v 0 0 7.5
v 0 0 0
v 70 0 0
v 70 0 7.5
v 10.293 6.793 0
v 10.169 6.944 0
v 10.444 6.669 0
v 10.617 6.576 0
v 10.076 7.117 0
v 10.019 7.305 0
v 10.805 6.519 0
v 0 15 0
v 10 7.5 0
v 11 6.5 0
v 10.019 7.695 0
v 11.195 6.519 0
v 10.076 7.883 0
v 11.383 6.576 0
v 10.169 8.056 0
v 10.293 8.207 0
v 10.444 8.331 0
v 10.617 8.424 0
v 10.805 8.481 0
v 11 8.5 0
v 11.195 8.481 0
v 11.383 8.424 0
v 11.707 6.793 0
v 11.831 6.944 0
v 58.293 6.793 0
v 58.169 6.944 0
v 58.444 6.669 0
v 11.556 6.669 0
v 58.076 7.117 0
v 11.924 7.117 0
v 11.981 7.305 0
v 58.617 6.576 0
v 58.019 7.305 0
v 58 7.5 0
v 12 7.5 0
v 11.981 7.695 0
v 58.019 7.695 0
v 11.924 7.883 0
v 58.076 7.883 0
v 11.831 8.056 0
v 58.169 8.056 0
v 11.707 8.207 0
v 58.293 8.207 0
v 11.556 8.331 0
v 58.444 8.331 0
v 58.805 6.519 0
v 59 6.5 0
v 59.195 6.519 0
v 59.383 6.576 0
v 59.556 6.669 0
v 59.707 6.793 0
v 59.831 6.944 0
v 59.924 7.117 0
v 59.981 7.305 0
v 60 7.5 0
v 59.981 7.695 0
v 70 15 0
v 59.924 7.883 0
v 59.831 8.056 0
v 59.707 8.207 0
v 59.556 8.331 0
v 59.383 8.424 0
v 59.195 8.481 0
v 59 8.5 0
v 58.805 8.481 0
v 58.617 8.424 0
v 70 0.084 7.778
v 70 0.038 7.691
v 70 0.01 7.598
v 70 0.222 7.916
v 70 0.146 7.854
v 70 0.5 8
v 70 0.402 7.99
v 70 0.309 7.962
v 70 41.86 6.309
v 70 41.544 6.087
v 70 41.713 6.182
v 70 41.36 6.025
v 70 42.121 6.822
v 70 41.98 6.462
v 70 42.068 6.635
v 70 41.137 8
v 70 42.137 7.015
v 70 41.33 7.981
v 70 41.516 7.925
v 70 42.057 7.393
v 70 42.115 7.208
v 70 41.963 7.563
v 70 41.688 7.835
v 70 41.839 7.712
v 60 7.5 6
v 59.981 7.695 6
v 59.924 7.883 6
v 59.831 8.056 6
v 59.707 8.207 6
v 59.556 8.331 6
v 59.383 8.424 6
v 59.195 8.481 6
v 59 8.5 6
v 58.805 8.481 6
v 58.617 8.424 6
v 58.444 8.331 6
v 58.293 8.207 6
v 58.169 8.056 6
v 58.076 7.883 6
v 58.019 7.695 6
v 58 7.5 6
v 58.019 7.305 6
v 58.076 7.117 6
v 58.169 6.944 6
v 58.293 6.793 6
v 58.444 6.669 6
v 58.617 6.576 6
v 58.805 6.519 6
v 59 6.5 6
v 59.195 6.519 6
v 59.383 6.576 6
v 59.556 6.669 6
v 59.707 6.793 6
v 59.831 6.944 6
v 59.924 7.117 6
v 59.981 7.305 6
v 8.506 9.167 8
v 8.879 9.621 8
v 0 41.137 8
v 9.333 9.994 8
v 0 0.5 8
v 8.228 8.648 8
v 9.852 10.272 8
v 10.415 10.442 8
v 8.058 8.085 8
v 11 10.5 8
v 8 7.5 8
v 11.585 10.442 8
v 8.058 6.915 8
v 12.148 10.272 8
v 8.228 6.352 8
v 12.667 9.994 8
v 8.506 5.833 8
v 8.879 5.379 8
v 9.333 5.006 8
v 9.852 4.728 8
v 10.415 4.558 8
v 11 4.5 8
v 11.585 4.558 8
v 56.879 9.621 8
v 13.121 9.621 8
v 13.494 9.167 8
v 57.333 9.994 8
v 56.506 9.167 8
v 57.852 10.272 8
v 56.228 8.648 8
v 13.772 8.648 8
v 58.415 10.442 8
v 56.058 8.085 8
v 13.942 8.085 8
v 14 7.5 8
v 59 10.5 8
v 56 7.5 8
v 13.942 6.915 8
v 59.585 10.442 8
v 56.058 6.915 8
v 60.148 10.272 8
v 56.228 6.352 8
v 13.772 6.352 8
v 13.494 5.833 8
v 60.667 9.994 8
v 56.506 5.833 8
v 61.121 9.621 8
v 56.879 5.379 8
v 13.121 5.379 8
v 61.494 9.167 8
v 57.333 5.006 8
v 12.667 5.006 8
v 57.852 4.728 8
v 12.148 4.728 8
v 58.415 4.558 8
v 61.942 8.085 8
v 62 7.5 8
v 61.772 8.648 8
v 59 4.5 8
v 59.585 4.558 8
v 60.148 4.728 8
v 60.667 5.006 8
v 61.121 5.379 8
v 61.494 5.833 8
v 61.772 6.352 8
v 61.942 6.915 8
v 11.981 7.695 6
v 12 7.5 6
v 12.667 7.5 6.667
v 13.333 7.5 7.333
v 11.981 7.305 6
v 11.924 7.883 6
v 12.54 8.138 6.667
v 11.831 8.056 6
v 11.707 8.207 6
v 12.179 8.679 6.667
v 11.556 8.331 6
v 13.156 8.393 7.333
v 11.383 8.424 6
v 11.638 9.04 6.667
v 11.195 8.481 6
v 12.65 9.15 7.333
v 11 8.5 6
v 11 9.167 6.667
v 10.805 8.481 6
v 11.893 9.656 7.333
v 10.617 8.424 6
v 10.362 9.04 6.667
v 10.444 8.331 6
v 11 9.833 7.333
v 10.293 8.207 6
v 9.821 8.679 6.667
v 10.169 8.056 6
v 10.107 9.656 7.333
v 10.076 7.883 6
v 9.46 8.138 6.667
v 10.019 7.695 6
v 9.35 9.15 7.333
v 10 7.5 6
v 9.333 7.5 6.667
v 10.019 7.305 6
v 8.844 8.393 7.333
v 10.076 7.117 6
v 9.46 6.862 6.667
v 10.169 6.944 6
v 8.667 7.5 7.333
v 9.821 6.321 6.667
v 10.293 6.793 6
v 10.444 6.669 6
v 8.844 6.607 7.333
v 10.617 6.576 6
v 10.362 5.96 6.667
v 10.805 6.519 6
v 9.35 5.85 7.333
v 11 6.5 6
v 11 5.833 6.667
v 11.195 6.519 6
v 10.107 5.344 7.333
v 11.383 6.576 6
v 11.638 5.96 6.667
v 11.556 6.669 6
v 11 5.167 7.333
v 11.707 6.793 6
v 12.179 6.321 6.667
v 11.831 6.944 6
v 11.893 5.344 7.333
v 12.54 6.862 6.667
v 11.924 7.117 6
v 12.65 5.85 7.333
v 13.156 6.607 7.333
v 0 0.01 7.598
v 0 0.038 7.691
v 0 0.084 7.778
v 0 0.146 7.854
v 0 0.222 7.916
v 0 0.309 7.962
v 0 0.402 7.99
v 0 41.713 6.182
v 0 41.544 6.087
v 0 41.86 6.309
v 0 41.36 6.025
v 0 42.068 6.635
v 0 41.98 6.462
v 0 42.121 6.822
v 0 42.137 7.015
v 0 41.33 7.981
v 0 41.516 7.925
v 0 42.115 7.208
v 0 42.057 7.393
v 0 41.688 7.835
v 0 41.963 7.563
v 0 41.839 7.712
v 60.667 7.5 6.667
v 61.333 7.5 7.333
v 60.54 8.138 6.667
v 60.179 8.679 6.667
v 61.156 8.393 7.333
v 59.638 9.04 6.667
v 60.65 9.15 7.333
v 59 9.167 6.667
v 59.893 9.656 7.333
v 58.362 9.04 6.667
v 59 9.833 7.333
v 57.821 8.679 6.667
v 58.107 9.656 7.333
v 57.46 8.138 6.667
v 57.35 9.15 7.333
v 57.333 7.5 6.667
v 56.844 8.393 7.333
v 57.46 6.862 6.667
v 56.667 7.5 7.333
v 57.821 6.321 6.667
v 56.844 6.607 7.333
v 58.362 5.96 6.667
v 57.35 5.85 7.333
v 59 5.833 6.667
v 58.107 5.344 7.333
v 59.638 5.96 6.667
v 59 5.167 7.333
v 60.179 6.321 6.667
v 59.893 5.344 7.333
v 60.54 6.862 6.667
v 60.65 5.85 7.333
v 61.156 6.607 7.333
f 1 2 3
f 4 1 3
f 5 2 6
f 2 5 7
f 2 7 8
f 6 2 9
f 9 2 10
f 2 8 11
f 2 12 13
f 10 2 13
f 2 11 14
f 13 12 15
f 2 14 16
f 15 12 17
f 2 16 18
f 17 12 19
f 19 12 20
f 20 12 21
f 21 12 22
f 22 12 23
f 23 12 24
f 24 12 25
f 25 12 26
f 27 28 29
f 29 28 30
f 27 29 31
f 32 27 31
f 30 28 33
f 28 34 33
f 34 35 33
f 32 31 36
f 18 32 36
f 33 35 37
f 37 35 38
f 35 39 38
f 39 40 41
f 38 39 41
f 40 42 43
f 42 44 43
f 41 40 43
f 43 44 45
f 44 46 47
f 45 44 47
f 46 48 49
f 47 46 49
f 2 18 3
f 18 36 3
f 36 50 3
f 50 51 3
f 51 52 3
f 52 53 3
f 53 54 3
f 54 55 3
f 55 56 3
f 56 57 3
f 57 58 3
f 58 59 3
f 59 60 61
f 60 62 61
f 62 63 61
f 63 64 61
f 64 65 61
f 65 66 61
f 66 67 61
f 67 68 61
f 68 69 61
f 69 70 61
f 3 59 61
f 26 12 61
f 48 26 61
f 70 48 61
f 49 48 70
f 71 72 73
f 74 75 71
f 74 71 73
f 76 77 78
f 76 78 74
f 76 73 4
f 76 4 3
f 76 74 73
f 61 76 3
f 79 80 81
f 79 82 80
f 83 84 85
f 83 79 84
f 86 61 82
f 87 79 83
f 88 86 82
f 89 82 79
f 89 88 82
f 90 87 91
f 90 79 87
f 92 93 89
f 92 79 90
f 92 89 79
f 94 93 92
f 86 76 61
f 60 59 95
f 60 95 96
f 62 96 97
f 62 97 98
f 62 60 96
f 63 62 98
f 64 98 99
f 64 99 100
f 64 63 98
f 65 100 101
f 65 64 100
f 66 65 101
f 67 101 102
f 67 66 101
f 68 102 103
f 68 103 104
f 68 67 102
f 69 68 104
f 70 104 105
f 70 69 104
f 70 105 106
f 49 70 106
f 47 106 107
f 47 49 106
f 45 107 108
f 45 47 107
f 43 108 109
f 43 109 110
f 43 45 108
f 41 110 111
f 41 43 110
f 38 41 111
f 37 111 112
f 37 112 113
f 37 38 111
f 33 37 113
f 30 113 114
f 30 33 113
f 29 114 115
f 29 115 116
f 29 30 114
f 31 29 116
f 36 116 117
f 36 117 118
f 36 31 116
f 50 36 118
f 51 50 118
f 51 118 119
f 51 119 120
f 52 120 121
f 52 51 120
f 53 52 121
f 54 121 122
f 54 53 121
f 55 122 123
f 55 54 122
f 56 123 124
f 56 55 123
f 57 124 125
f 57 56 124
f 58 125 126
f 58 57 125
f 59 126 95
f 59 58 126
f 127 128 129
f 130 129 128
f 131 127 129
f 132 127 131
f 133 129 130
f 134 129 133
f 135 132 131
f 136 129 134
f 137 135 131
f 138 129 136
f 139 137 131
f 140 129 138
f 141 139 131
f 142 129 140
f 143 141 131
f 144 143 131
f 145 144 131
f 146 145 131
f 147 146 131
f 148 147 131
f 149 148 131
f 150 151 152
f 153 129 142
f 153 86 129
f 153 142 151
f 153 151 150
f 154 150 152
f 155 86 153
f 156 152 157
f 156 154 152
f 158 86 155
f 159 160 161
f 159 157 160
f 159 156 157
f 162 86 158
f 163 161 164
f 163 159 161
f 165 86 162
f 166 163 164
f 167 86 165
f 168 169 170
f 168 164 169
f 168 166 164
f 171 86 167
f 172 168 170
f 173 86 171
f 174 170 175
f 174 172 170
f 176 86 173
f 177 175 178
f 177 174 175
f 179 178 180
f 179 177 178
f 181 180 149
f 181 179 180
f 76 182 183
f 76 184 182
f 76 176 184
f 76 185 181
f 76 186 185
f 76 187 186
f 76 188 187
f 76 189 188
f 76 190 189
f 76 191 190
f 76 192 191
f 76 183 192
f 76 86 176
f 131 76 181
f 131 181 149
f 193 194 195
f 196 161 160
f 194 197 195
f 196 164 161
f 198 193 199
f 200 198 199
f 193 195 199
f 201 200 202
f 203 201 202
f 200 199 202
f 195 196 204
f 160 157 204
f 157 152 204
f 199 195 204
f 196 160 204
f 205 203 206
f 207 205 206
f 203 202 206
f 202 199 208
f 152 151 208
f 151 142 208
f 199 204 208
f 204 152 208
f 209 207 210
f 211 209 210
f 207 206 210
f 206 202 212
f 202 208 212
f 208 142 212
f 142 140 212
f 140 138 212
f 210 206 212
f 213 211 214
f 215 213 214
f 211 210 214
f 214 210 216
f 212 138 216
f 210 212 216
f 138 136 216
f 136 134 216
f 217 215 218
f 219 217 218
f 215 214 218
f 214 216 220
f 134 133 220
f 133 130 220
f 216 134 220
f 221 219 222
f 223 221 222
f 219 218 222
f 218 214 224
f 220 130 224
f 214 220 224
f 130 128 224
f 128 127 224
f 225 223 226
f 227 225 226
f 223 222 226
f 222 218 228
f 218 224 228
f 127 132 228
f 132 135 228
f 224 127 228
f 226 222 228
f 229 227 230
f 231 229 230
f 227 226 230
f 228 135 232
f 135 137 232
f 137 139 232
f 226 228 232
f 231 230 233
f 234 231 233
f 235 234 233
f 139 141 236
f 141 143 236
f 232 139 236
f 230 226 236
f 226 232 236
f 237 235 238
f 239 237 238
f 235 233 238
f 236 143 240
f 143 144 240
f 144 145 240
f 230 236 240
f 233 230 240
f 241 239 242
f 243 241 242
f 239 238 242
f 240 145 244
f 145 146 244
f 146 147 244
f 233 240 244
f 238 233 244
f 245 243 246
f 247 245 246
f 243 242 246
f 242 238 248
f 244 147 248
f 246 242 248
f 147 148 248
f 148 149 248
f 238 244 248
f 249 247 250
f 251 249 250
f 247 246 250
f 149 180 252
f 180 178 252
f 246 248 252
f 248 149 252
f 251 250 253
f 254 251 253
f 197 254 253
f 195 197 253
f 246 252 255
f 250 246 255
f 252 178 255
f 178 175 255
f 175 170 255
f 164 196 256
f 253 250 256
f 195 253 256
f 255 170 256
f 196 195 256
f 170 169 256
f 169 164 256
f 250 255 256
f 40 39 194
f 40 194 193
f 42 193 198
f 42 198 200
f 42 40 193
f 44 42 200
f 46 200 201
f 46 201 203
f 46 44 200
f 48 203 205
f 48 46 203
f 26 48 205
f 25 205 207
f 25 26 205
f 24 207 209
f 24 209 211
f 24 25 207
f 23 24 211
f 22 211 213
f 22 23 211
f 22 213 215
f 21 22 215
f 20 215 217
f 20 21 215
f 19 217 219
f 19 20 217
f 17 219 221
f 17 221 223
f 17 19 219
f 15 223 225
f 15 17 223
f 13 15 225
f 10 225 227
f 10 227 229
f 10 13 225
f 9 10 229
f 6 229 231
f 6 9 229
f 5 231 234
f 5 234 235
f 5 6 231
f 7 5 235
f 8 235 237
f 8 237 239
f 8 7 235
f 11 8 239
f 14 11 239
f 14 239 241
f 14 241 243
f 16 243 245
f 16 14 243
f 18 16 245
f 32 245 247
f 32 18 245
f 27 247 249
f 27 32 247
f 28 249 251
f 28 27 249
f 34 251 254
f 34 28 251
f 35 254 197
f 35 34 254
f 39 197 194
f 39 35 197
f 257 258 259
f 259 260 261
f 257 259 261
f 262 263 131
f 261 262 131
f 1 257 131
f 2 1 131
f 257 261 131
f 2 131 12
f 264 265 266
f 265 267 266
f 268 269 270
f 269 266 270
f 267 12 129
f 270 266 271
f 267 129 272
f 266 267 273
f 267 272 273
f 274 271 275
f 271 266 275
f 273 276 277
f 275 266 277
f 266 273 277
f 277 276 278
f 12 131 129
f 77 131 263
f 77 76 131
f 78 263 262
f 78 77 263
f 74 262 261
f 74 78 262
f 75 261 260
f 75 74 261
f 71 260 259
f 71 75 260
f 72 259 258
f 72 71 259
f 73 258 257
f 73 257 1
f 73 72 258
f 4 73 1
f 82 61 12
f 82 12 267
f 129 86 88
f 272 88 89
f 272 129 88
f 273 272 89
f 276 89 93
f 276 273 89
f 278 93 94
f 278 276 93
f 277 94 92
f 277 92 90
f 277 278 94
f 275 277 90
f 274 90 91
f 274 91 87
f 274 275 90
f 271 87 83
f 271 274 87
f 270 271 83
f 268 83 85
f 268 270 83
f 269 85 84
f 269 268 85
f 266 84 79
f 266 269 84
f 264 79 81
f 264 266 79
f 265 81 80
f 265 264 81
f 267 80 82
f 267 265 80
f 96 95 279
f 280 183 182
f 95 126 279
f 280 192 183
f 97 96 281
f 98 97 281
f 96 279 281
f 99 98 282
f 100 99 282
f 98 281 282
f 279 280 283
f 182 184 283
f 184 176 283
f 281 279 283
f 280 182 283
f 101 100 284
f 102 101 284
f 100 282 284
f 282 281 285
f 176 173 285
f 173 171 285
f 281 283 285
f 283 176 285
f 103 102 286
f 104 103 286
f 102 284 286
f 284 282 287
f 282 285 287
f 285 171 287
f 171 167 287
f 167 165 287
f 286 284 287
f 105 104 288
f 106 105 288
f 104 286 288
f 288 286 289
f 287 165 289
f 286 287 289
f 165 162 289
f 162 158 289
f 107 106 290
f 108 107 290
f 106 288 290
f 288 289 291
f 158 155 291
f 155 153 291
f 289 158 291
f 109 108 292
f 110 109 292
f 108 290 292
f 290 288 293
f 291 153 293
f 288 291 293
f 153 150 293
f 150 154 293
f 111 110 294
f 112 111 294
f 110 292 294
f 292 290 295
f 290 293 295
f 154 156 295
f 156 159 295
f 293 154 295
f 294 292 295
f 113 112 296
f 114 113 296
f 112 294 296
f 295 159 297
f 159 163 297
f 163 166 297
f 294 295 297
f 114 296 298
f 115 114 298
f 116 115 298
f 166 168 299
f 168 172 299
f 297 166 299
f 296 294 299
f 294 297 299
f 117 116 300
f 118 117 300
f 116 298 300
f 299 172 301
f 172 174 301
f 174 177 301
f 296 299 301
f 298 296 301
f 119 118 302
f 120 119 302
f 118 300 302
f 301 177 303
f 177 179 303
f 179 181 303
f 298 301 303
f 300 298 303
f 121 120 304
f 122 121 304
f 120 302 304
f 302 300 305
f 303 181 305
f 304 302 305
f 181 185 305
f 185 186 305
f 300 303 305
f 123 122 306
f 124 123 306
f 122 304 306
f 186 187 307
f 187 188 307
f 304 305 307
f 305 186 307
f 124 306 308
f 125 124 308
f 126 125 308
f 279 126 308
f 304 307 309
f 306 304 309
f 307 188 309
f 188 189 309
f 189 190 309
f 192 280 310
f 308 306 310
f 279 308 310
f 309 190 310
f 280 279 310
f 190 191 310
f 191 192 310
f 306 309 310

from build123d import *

# Parameters (mm, degrees)
F0_W     = 70
F0_H     = 15
F0_R     = 1
F1_DEPTH = 8
F2_SIZE  = 2
F4_DEPTH = 70
F5_R     = 1
F6_R     = 0.5


with BuildPart() as f1:
    # F0 (on Top) → F1 (new body)
    with BuildSketch(Plane.XY):
        with Locations((35, 7.5)):
            Rectangle(F0_W, F0_H)
        with Locations((11, 7.5)):
            Circle(F0_R, mode=Mode.SUBTRACT)
        with Locations((59, 7.5)):
            Circle(F0_R, mode=Mode.SUBTRACT)
    extrude(amount=F1_DEPTH)

    # F2
    f2_edges = [f1.edges().sort_by_distance(p)[0] for p in [
        (10, 7.5, 8),
        (58, 7.5, 8),
    ]]
    chamfer(f2_edges, length=F2_SIZE)

    # F3 (on face) → F4 (join)
    with BuildSketch(Plane.YZ.offset(70)):
        Polygon((50, 8), (15, 8), (15, 0), align=None)
    extrude(amount=-F4_DEPTH)

    # F5
    f5_edges = [f1.edges().sort_by_distance(p)[0] for p in [
        (35, 50, 8),
    ]]
    fillet(f5_edges, radius=F5_R)

    # F6
    f6_edges = [f1.edges().sort_by_distance(p)[0] for p in [
        (35, 0, 8),
    ]]
    fillet(f6_edges, radius=F6_R)


solid = f1.part
